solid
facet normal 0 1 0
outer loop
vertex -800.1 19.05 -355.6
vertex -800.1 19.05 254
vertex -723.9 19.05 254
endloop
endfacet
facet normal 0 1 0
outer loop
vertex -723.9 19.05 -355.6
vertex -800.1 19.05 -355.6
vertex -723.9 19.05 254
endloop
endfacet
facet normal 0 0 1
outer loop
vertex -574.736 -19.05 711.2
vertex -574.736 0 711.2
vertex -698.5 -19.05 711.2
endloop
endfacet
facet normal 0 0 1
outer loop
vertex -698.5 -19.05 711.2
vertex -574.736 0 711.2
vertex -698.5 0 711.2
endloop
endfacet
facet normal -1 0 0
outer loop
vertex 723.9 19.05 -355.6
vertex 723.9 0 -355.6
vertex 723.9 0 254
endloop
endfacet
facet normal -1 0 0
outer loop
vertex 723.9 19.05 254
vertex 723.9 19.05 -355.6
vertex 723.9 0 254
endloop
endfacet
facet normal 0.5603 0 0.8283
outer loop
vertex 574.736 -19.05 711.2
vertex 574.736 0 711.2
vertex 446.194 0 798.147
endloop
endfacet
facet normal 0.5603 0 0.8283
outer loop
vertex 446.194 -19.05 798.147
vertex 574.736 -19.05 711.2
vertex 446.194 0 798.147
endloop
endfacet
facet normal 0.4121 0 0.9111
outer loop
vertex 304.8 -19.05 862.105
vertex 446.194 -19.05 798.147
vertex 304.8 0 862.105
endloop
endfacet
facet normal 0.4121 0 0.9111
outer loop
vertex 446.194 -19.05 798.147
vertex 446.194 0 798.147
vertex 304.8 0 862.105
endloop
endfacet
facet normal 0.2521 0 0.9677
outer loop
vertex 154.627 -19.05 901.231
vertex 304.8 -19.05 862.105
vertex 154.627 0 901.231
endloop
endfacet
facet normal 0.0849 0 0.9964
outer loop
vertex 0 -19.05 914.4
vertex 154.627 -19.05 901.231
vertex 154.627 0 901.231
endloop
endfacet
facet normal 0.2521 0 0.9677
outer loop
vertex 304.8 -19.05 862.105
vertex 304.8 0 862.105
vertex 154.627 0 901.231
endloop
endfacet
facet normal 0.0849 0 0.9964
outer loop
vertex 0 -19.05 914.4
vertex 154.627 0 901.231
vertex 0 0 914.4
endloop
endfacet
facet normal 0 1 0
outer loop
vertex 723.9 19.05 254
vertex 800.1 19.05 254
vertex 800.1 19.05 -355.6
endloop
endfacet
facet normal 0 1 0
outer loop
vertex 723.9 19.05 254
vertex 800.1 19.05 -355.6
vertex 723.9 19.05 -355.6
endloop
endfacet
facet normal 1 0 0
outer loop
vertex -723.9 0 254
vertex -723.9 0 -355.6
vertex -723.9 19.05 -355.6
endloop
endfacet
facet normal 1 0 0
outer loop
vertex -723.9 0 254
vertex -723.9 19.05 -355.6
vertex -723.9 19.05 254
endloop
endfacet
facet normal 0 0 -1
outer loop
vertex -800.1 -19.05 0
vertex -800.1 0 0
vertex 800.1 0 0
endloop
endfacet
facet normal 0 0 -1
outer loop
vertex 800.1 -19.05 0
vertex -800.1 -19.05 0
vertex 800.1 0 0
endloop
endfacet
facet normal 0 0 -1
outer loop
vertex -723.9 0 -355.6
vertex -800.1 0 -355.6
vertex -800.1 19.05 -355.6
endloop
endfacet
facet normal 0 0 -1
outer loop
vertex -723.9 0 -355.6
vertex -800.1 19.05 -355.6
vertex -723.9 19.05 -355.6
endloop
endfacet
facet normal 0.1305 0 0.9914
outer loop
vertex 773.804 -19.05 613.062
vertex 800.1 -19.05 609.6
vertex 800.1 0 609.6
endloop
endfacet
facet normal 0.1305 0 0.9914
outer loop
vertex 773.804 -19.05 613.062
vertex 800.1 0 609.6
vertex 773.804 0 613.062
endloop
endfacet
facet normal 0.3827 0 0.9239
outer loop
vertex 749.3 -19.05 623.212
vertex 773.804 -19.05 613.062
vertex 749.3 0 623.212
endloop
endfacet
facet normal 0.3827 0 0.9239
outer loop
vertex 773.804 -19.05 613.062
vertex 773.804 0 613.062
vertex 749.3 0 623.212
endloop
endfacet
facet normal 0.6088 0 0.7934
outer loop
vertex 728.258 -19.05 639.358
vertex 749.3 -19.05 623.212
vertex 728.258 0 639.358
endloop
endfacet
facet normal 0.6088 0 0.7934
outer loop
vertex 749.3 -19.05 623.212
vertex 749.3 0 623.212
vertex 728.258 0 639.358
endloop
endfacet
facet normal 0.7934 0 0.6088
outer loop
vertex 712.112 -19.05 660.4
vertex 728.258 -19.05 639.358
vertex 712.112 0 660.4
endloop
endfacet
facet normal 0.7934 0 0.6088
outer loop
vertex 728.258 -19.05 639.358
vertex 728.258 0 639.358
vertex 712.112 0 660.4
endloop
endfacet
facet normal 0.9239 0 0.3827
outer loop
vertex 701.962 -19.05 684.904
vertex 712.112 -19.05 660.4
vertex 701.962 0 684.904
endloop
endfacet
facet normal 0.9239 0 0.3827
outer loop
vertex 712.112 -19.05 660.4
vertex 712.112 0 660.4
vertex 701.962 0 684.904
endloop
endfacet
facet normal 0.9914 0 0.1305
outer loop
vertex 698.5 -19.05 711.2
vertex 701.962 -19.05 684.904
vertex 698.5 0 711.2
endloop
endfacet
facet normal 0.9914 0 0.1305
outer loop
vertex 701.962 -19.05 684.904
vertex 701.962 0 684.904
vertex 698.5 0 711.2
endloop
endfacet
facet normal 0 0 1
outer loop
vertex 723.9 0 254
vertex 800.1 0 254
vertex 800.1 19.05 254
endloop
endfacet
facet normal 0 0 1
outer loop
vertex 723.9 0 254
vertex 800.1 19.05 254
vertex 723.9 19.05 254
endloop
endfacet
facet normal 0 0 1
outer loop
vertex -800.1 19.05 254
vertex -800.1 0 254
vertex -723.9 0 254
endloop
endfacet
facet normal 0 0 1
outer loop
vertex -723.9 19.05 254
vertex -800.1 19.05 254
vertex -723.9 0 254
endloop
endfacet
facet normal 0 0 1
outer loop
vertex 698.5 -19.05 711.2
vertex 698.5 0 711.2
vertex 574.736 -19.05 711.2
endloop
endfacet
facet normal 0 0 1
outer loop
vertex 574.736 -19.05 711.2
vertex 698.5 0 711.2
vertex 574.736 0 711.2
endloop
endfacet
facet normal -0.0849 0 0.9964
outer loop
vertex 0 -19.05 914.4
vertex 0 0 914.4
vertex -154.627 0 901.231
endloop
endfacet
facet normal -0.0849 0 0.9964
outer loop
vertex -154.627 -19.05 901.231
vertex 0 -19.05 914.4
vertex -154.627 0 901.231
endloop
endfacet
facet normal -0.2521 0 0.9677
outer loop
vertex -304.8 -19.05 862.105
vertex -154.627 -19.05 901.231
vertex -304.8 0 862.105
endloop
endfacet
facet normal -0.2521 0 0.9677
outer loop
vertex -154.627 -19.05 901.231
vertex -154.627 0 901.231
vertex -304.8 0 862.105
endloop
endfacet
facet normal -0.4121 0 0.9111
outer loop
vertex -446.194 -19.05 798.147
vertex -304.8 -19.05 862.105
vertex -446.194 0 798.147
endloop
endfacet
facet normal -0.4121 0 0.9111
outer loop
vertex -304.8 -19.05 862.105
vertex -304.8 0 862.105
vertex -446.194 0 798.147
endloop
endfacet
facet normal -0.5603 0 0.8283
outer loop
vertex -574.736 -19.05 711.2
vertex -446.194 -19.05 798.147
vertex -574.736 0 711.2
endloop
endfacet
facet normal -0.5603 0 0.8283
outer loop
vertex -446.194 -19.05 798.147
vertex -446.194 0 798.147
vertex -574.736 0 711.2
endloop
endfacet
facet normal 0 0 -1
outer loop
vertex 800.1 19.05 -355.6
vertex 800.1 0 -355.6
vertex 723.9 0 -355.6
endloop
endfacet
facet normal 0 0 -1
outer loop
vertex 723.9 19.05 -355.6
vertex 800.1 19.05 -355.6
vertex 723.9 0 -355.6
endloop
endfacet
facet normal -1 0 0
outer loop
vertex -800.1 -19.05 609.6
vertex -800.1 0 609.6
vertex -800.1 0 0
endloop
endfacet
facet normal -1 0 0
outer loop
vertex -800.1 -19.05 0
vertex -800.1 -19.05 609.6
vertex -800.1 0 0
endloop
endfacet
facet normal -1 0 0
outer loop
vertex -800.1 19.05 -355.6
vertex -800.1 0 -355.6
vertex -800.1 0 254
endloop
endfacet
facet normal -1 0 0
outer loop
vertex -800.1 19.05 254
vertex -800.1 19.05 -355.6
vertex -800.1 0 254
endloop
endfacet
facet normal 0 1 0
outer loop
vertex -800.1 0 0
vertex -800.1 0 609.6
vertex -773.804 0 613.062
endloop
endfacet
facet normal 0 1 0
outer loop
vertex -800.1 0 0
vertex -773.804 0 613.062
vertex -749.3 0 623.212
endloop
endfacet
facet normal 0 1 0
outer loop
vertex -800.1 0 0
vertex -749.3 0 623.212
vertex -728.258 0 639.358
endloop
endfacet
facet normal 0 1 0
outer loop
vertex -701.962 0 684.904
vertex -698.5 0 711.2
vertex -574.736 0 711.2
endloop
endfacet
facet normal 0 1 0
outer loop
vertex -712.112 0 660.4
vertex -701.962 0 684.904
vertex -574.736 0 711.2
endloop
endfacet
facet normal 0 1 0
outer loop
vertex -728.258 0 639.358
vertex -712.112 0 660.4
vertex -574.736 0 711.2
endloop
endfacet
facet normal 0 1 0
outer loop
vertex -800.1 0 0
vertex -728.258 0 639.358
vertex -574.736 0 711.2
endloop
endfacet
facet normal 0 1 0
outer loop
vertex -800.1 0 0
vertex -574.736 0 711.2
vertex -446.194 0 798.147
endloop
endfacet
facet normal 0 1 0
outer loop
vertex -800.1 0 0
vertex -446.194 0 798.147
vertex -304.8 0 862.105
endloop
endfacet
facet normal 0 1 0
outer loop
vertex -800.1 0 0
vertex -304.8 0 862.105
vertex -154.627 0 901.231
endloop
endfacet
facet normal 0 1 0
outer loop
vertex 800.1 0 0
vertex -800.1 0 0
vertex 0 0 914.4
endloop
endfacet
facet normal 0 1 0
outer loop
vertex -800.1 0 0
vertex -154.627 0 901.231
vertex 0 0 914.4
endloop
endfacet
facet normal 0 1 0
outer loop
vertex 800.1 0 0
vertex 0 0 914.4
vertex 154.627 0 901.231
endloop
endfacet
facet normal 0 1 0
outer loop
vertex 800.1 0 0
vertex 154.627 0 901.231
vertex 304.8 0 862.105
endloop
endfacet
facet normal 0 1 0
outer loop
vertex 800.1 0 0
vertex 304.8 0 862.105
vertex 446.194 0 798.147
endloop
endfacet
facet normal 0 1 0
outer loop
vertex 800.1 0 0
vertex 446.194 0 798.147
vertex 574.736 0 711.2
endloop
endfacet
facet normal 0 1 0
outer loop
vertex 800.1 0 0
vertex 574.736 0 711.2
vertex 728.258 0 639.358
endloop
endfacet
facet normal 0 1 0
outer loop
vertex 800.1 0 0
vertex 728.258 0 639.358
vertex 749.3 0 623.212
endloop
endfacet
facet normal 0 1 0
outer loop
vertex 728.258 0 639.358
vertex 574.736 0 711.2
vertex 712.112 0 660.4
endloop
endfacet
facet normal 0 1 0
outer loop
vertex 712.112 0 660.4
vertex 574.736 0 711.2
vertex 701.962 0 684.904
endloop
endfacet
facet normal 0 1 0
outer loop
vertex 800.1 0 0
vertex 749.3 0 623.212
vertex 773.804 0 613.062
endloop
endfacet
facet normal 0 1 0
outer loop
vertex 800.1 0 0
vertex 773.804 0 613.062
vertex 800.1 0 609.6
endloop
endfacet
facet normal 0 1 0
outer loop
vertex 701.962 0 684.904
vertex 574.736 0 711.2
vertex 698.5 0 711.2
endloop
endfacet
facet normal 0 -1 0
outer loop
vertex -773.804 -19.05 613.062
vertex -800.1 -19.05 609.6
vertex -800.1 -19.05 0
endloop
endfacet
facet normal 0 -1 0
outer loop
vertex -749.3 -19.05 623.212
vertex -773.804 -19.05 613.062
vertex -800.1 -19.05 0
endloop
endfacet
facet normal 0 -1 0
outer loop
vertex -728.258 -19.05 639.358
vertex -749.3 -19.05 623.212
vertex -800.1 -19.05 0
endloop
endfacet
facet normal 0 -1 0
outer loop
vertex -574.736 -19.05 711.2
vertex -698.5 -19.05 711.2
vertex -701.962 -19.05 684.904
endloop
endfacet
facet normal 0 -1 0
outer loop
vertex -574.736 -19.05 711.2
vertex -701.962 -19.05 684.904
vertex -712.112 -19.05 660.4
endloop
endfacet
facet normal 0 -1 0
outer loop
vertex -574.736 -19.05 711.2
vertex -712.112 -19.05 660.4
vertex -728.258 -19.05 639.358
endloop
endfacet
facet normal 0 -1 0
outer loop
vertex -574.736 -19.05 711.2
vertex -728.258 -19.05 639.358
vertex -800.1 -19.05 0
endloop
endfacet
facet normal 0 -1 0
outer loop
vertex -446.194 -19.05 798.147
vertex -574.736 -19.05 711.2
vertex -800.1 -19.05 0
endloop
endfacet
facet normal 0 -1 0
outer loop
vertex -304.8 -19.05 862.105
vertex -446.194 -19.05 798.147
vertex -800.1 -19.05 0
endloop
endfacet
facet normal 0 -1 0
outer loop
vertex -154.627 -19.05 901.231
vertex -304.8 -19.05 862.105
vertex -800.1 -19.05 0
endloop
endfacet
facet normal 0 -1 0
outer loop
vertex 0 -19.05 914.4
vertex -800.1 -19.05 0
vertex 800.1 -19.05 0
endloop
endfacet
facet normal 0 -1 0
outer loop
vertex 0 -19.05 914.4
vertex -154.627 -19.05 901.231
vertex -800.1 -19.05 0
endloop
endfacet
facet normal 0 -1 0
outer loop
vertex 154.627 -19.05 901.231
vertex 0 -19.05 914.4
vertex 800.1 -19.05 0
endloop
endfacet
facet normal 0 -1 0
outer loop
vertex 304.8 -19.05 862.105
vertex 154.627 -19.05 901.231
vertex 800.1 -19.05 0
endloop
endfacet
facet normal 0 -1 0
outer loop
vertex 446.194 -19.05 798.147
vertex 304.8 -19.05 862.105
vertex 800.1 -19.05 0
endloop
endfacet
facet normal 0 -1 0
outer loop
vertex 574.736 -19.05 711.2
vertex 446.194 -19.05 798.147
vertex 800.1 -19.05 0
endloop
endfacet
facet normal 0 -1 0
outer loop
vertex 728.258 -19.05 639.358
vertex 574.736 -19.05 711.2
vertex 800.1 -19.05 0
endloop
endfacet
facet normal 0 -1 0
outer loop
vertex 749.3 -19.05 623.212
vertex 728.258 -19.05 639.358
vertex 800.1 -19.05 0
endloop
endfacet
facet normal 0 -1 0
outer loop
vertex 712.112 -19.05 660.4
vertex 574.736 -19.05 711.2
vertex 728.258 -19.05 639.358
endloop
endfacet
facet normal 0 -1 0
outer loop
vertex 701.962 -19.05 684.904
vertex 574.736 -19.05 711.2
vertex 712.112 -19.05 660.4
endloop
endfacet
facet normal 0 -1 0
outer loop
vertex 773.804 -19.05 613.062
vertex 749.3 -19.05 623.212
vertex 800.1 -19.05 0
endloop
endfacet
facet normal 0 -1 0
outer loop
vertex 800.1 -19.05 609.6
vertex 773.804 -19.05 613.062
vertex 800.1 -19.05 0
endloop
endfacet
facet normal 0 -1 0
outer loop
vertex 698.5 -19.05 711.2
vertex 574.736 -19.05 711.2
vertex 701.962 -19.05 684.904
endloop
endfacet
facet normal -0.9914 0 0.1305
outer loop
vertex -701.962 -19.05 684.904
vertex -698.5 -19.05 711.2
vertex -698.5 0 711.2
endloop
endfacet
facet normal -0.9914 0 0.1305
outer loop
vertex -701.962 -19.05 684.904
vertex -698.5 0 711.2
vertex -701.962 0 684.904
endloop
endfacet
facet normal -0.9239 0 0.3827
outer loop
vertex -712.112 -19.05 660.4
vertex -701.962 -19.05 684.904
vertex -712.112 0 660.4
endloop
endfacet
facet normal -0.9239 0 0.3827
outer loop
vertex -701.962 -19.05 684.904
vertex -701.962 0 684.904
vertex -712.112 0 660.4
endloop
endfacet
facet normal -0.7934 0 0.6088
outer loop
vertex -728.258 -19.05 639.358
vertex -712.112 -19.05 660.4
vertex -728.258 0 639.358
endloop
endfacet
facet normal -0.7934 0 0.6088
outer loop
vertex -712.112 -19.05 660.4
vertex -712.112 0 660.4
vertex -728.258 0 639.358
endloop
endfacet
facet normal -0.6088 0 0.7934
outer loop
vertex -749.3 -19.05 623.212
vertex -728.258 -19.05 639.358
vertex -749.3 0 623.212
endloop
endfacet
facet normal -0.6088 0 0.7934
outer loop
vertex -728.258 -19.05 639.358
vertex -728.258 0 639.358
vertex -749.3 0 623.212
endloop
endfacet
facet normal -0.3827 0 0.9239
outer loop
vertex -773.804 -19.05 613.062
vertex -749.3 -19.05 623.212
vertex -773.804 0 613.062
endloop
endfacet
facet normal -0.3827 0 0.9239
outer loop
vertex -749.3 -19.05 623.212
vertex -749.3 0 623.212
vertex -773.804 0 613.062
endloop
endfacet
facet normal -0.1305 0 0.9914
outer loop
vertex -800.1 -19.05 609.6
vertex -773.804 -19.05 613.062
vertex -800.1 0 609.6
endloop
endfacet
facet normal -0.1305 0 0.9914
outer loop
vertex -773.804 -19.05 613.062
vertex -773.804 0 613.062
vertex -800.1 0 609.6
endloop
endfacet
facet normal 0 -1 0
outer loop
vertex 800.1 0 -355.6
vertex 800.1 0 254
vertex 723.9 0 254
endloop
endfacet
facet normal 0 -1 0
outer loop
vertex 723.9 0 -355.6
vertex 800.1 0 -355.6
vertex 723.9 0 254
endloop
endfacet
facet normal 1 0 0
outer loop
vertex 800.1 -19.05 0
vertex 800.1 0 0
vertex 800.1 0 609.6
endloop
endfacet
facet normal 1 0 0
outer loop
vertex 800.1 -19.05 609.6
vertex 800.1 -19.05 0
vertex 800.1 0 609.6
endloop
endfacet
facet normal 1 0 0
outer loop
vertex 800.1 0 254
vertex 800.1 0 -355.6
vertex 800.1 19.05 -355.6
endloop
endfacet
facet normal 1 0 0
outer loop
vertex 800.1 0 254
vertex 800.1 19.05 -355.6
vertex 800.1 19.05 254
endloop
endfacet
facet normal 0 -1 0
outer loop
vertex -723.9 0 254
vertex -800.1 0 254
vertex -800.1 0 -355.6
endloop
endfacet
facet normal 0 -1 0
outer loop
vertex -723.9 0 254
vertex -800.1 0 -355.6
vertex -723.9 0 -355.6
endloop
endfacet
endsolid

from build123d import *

# Parameters (mm, degrees)
F1_DEPTH = 19.05
F2_W     = 76.2
F2_H     = 609.6
F3_DEPTH = 19.05


with BuildPart() as f1:
    # F0 (on Front) → F1 (new body)
    with BuildSketch(Plane.XZ):
        with BuildLine():
            Line((-800.1, 0), (0, 0))
            Line((0, 0), (800.1, 0))
            Line((800.1, 0), (800.1, 609.6))
            ThreePointArc((800.1, 609.6), (728.257951, 639.357951), (698.5, 711.2))
            Line((698.5, 711.2), (574.736392, 711.2))
            ThreePointArc((574.736392, 711.2), (304.8, 862.104588), (0, 914.4))
            ThreePointArc((0, 914.4), (-304.8, 862.104588), (-574.736392, 711.2))
            Line((-574.736392, 711.2), (-698.5, 711.2))
            ThreePointArc((-698.5, 711.2), (-728.257951, 639.357951), (-800.1, 609.6))
            Line((-800.1, 609.6), (-800.1, 0))
        make_face()
    extrude(amount=F1_DEPTH)


with BuildPart() as f3:
    # F2 (on face) → F3 (new body)
    with BuildSketch(Plane(origin=(0, 0, 0), x_dir=(-1, 0, 0), z_dir=(0, 1, 0))):
        with Locations((-762, -50.8)):
            Rectangle(F2_W, F2_H)
    extrude(amount=F3_DEPTH)


with BuildPart() as f4_1:
    # F4: instance of F3
    add(f3.part.mirror(Plane.YZ))


solid = Compound([f1.part, f3.part, f4_1.part])
